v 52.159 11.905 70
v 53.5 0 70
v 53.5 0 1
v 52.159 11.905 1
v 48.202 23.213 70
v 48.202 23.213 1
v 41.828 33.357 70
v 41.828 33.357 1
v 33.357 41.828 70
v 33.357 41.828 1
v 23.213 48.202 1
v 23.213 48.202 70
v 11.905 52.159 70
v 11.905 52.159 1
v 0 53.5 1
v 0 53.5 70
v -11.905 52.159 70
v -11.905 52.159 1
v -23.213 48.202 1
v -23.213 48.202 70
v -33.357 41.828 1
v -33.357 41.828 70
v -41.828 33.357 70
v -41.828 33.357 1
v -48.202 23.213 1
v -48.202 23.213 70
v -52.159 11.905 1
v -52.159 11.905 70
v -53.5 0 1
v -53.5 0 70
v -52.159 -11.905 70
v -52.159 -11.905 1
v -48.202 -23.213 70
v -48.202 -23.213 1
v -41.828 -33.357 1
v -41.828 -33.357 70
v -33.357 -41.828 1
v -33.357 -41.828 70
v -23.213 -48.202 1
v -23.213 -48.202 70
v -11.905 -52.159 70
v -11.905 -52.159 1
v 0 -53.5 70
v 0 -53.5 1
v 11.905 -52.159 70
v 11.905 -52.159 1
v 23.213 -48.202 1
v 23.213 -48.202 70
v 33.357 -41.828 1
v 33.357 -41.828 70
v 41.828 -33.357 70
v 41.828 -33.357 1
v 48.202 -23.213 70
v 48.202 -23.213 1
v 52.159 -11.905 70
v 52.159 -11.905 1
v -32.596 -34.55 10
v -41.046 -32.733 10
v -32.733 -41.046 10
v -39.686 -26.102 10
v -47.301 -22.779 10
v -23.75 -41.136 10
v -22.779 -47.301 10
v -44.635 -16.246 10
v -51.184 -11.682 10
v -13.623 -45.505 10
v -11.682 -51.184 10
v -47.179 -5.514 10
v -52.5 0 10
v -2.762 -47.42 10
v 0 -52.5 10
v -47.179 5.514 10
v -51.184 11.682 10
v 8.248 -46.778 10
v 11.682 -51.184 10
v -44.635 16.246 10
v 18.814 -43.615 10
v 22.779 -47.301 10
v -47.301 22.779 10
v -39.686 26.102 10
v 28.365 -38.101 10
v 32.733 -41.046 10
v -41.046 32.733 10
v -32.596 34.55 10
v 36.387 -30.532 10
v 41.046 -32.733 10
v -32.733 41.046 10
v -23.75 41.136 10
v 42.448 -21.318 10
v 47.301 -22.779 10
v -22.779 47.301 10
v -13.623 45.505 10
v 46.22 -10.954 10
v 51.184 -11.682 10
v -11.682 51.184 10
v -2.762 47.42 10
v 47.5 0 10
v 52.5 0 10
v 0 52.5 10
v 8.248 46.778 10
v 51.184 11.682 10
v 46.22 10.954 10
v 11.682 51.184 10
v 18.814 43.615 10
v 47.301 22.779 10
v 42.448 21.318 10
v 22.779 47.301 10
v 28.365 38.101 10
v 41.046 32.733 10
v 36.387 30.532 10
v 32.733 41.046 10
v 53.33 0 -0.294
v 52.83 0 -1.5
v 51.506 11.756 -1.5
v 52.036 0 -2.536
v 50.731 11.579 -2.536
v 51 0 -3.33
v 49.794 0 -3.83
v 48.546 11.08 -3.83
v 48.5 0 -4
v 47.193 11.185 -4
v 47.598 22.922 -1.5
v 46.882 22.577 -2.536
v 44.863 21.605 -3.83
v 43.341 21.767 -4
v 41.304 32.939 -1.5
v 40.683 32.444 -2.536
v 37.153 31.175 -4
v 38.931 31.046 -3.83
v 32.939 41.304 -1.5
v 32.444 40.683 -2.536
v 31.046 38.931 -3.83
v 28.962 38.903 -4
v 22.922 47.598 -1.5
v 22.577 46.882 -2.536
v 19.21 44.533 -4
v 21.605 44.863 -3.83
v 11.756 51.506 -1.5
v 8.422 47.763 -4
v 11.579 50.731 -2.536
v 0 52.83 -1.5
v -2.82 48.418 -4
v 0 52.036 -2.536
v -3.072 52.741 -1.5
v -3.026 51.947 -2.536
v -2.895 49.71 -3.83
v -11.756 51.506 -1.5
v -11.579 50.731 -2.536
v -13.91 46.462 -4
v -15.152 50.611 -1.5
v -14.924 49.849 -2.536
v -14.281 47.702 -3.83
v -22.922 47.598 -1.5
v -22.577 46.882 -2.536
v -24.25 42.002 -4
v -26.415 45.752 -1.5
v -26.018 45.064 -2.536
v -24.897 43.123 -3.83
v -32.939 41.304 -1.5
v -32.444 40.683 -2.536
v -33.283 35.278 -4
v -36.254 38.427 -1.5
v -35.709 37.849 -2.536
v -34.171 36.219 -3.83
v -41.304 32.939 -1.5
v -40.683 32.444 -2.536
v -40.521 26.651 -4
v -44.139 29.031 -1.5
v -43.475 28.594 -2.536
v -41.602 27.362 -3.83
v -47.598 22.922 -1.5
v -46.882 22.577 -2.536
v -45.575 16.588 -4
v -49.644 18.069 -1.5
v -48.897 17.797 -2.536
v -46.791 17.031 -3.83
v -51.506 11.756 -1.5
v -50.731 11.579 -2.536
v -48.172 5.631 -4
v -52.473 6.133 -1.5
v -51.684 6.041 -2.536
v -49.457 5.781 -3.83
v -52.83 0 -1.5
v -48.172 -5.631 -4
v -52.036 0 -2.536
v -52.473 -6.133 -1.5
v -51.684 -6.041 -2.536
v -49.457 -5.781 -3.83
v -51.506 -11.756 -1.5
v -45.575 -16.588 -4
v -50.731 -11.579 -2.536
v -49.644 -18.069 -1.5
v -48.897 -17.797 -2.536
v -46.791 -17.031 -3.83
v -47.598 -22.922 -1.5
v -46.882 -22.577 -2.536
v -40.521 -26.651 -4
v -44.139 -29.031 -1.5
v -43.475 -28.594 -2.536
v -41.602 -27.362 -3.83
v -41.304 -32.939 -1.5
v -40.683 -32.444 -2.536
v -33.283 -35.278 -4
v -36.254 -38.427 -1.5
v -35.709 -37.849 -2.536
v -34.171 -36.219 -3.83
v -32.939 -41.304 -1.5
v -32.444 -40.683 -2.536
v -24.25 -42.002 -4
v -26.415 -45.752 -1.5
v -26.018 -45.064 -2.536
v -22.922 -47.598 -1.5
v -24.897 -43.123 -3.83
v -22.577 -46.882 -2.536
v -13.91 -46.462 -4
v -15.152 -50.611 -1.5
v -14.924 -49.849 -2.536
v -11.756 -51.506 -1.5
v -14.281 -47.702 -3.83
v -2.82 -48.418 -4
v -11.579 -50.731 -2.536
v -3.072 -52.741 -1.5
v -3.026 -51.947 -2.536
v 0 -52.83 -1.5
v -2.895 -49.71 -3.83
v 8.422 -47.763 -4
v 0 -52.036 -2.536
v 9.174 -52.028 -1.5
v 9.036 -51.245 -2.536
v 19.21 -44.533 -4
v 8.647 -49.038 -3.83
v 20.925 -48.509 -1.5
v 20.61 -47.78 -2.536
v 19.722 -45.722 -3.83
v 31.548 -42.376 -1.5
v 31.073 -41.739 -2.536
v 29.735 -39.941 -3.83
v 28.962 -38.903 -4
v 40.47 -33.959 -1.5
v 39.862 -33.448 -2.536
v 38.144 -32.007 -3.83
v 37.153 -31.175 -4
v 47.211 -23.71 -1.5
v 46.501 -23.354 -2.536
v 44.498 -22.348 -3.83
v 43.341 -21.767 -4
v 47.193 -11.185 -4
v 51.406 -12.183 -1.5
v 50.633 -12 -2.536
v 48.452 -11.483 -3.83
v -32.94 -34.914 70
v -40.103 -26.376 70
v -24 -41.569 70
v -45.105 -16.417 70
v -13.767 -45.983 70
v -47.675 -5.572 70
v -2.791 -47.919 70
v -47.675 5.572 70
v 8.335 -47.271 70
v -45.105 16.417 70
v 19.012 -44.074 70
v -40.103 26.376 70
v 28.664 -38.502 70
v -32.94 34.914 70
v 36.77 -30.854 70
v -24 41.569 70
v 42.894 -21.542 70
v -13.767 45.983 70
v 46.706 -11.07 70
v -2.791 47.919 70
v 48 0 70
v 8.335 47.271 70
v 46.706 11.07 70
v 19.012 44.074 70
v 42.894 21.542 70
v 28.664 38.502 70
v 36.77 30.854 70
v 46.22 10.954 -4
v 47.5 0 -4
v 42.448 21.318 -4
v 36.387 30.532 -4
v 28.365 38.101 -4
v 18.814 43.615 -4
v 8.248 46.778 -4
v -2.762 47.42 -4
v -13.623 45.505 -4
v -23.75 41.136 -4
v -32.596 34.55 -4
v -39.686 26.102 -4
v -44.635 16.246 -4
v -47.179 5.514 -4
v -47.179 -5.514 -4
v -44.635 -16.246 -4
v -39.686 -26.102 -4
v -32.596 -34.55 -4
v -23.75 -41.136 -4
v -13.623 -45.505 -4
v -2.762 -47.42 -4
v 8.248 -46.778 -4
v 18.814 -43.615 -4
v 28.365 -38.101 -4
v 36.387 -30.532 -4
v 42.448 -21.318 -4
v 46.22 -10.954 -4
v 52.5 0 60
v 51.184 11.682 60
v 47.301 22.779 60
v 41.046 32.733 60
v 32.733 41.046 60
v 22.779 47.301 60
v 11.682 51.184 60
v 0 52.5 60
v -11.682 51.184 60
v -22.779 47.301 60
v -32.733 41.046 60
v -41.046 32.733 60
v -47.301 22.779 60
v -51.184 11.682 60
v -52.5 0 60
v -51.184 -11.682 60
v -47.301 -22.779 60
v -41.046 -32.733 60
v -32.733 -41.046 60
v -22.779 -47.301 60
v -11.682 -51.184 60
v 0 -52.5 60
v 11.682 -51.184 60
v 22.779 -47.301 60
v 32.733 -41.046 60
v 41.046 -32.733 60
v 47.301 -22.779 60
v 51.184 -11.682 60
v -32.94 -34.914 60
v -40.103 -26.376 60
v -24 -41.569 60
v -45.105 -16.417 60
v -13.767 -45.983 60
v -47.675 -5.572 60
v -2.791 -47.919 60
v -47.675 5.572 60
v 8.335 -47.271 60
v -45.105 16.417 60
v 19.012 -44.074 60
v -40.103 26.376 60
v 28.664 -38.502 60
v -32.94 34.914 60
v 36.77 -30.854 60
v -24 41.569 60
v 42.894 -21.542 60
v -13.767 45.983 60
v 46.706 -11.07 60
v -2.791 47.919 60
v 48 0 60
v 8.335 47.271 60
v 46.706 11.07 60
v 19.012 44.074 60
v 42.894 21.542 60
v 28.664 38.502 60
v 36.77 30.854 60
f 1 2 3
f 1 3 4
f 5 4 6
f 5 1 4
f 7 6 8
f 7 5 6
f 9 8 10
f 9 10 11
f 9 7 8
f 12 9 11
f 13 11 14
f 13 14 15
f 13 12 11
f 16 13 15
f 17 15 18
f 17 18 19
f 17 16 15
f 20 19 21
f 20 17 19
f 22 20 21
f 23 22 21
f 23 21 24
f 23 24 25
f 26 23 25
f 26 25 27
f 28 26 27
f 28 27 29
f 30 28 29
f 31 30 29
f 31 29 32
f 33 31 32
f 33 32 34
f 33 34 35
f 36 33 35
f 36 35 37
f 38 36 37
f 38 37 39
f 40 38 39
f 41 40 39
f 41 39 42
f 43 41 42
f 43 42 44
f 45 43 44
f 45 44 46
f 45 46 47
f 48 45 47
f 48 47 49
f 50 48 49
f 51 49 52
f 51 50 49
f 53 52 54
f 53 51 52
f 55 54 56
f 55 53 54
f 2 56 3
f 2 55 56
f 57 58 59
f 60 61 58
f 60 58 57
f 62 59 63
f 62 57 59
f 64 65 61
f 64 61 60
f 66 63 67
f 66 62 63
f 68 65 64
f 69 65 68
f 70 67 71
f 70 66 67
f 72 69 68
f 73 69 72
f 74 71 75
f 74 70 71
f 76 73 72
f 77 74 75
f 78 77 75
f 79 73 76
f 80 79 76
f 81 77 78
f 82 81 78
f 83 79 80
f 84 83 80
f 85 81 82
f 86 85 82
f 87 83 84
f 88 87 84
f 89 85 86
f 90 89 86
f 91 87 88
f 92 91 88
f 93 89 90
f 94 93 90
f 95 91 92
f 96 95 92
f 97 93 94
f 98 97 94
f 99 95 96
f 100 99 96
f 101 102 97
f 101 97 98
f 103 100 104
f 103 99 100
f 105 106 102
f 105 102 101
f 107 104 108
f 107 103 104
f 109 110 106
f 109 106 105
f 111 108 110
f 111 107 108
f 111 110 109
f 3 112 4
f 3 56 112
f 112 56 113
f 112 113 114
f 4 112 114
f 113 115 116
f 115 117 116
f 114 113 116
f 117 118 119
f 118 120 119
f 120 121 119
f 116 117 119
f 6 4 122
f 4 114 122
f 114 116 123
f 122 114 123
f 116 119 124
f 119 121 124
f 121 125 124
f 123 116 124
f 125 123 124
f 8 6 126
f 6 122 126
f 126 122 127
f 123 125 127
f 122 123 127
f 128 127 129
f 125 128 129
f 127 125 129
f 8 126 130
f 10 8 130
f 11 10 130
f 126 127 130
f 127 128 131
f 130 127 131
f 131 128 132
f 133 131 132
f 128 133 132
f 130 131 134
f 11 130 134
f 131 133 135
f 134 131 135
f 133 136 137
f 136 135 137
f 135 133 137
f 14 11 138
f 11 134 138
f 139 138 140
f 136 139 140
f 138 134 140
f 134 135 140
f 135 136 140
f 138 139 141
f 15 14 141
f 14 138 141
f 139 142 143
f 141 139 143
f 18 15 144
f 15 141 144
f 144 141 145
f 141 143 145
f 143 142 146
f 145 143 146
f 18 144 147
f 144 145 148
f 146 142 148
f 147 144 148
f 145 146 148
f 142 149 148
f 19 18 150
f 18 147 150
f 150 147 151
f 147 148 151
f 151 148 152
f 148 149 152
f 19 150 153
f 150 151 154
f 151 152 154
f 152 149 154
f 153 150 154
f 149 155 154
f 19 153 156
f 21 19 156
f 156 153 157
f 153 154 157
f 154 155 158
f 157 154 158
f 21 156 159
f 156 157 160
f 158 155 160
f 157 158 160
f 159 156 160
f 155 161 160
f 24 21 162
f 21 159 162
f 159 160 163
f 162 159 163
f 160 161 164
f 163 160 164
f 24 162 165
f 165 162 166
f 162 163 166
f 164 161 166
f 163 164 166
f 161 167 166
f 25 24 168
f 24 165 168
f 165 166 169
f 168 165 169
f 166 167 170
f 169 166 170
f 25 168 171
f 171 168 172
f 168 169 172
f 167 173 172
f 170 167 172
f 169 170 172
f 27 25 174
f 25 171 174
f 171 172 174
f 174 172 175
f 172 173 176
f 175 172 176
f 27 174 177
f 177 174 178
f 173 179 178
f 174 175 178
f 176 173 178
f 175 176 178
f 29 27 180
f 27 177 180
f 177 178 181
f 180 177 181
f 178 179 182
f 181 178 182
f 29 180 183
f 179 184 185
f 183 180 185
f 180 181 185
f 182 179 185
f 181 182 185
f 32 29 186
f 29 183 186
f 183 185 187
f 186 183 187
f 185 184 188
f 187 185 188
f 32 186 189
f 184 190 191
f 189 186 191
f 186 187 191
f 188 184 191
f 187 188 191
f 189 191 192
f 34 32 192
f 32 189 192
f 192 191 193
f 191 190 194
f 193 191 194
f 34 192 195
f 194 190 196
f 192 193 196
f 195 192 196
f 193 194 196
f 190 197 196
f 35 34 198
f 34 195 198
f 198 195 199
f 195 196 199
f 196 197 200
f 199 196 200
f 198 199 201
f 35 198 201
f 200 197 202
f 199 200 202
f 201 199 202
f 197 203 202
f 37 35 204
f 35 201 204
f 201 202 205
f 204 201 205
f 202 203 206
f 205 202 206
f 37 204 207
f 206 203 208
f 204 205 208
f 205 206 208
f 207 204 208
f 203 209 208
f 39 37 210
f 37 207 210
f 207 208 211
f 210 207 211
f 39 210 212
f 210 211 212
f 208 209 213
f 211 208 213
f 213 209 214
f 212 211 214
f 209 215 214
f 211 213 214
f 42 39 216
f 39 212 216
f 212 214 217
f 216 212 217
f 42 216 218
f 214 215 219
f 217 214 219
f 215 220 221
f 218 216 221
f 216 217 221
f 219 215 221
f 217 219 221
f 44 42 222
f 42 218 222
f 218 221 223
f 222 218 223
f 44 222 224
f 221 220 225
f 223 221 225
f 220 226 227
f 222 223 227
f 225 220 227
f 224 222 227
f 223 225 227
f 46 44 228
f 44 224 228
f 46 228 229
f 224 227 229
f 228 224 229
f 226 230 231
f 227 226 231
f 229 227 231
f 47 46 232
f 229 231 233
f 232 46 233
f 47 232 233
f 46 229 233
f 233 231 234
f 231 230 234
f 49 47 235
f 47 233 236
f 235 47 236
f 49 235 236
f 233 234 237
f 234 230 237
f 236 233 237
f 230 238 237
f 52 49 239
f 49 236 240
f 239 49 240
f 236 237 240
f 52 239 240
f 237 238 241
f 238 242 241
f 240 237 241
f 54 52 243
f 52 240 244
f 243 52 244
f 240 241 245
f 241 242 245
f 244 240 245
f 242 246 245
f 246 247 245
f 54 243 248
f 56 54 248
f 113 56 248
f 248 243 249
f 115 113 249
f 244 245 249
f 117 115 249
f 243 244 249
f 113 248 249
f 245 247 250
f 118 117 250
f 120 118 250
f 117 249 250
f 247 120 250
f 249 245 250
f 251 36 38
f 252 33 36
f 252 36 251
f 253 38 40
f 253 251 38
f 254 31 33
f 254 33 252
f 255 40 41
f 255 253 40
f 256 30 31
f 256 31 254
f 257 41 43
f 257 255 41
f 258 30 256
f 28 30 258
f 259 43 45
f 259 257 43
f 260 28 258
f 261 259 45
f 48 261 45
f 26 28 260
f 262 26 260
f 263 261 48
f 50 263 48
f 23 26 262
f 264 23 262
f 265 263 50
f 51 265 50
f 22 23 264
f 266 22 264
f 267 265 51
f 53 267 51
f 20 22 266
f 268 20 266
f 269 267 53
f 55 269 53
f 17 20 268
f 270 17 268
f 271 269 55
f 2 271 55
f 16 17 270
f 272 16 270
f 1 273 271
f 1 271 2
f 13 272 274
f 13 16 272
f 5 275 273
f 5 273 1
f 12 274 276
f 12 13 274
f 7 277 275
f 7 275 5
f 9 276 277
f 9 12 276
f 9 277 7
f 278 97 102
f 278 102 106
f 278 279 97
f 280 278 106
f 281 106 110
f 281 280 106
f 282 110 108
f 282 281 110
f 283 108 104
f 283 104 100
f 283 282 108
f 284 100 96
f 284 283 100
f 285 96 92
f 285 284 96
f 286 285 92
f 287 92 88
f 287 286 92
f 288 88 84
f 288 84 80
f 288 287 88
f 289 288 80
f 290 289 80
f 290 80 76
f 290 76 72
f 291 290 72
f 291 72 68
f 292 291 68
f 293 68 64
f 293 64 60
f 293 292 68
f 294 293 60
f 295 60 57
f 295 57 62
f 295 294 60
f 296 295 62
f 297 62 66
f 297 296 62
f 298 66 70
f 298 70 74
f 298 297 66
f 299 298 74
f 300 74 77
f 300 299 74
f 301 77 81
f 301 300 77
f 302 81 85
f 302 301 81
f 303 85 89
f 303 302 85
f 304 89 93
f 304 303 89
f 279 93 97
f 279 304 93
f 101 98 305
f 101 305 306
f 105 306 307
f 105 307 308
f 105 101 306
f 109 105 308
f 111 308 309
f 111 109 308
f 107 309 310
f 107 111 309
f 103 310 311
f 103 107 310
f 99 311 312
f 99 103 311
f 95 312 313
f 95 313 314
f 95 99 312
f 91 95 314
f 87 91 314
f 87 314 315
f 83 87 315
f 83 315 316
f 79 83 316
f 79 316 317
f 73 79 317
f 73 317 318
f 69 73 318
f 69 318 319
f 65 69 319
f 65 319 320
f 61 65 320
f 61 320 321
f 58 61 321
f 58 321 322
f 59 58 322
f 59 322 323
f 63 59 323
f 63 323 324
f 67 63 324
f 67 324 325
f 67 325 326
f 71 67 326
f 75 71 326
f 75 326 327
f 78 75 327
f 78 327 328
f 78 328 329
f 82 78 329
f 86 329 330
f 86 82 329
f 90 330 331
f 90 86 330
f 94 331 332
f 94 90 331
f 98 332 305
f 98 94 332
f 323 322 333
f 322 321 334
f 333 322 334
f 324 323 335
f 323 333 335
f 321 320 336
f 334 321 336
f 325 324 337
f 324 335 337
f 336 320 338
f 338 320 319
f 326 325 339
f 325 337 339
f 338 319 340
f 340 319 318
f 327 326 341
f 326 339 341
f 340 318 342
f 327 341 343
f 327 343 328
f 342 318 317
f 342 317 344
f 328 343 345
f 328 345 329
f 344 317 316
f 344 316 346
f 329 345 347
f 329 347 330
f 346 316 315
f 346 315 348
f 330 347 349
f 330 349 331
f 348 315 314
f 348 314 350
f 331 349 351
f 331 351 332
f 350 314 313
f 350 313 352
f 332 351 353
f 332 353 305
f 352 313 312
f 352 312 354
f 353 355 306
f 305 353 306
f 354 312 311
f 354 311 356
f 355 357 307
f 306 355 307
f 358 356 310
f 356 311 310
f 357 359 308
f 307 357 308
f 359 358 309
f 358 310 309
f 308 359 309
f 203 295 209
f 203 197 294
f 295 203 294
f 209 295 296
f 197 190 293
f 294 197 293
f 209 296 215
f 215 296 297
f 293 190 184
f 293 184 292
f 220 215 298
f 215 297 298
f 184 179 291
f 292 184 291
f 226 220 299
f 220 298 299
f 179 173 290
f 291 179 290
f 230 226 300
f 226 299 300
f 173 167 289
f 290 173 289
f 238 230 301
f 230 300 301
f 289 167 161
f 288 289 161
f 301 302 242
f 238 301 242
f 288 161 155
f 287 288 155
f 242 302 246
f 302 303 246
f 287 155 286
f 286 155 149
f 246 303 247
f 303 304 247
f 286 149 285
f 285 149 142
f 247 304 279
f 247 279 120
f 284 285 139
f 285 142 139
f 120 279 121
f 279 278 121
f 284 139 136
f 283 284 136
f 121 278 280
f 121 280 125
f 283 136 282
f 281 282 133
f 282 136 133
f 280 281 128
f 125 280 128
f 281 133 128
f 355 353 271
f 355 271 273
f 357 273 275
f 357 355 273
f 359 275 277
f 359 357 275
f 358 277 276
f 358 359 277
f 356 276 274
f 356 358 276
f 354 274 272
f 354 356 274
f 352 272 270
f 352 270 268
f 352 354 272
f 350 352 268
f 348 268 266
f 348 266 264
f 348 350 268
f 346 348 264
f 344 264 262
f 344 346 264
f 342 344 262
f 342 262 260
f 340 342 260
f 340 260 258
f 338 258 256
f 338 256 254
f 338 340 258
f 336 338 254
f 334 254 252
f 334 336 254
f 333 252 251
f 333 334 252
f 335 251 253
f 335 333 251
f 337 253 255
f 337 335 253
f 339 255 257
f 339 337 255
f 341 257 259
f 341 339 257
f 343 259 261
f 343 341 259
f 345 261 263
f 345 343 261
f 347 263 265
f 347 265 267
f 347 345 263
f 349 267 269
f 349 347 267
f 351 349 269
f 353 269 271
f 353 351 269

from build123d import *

# Parameters (mm, degrees)
F0_R          = 52.5
F0_R_2        = 50.5
F0_R_3        = 47.5
F1_DEPTH      = 10
F1_DEPTH_BACK = 4
F0_R_4        = 53.5
F2_DEPTH      = 70
F2_DEPTH_BACK = 4
F4_R          = 52.5
F4_R_2        = 48
F5_DEPTH      = 10
F8_R          = 5


# Not quite as in the source:
# - the program builds the solid bodies; features that only make, move or delete a surface that nothing else refers to are left out


with BuildPart() as f1:
    # F0 (on Top) → F1 (new body, two sides)
    with BuildSketch(Plane.XY) as f1_sk:
        Circle(F0_R)
        Circle(F0_R_2, mode=Mode.SUBTRACT)
        Circle(F0_R_2)
        Circle(F0_R_3, mode=Mode.SUBTRACT)
    extrude(amount=F1_DEPTH)
    extrude(f1_sk.sketch, amount=-F1_DEPTH_BACK)

    # F0 (on Top) → F2 (join, two sides)
    with BuildSketch(Plane.XY) as f2_sk:
        Circle(F0_R_4)
        Circle(F0_R, mode=Mode.SUBTRACT)
    extrude(amount=F2_DEPTH)
    extrude(f2_sk.sketch, amount=-F2_DEPTH_BACK)

    # F4 (on offset) → F5 (join)
    with BuildSketch(Plane.XY.offset(60)):
        Circle(F4_R)
        Circle(F4_R_2, mode=Mode.SUBTRACT)
    extrude(amount=F5_DEPTH)

    # F8
    f8_edges = [f1.edges().sort_by_distance(p)[0] for p in [
        (-53.5, 0, -4),
    ]]
    fillet(f8_edges, radius=F8_R)


solid = f1.part
